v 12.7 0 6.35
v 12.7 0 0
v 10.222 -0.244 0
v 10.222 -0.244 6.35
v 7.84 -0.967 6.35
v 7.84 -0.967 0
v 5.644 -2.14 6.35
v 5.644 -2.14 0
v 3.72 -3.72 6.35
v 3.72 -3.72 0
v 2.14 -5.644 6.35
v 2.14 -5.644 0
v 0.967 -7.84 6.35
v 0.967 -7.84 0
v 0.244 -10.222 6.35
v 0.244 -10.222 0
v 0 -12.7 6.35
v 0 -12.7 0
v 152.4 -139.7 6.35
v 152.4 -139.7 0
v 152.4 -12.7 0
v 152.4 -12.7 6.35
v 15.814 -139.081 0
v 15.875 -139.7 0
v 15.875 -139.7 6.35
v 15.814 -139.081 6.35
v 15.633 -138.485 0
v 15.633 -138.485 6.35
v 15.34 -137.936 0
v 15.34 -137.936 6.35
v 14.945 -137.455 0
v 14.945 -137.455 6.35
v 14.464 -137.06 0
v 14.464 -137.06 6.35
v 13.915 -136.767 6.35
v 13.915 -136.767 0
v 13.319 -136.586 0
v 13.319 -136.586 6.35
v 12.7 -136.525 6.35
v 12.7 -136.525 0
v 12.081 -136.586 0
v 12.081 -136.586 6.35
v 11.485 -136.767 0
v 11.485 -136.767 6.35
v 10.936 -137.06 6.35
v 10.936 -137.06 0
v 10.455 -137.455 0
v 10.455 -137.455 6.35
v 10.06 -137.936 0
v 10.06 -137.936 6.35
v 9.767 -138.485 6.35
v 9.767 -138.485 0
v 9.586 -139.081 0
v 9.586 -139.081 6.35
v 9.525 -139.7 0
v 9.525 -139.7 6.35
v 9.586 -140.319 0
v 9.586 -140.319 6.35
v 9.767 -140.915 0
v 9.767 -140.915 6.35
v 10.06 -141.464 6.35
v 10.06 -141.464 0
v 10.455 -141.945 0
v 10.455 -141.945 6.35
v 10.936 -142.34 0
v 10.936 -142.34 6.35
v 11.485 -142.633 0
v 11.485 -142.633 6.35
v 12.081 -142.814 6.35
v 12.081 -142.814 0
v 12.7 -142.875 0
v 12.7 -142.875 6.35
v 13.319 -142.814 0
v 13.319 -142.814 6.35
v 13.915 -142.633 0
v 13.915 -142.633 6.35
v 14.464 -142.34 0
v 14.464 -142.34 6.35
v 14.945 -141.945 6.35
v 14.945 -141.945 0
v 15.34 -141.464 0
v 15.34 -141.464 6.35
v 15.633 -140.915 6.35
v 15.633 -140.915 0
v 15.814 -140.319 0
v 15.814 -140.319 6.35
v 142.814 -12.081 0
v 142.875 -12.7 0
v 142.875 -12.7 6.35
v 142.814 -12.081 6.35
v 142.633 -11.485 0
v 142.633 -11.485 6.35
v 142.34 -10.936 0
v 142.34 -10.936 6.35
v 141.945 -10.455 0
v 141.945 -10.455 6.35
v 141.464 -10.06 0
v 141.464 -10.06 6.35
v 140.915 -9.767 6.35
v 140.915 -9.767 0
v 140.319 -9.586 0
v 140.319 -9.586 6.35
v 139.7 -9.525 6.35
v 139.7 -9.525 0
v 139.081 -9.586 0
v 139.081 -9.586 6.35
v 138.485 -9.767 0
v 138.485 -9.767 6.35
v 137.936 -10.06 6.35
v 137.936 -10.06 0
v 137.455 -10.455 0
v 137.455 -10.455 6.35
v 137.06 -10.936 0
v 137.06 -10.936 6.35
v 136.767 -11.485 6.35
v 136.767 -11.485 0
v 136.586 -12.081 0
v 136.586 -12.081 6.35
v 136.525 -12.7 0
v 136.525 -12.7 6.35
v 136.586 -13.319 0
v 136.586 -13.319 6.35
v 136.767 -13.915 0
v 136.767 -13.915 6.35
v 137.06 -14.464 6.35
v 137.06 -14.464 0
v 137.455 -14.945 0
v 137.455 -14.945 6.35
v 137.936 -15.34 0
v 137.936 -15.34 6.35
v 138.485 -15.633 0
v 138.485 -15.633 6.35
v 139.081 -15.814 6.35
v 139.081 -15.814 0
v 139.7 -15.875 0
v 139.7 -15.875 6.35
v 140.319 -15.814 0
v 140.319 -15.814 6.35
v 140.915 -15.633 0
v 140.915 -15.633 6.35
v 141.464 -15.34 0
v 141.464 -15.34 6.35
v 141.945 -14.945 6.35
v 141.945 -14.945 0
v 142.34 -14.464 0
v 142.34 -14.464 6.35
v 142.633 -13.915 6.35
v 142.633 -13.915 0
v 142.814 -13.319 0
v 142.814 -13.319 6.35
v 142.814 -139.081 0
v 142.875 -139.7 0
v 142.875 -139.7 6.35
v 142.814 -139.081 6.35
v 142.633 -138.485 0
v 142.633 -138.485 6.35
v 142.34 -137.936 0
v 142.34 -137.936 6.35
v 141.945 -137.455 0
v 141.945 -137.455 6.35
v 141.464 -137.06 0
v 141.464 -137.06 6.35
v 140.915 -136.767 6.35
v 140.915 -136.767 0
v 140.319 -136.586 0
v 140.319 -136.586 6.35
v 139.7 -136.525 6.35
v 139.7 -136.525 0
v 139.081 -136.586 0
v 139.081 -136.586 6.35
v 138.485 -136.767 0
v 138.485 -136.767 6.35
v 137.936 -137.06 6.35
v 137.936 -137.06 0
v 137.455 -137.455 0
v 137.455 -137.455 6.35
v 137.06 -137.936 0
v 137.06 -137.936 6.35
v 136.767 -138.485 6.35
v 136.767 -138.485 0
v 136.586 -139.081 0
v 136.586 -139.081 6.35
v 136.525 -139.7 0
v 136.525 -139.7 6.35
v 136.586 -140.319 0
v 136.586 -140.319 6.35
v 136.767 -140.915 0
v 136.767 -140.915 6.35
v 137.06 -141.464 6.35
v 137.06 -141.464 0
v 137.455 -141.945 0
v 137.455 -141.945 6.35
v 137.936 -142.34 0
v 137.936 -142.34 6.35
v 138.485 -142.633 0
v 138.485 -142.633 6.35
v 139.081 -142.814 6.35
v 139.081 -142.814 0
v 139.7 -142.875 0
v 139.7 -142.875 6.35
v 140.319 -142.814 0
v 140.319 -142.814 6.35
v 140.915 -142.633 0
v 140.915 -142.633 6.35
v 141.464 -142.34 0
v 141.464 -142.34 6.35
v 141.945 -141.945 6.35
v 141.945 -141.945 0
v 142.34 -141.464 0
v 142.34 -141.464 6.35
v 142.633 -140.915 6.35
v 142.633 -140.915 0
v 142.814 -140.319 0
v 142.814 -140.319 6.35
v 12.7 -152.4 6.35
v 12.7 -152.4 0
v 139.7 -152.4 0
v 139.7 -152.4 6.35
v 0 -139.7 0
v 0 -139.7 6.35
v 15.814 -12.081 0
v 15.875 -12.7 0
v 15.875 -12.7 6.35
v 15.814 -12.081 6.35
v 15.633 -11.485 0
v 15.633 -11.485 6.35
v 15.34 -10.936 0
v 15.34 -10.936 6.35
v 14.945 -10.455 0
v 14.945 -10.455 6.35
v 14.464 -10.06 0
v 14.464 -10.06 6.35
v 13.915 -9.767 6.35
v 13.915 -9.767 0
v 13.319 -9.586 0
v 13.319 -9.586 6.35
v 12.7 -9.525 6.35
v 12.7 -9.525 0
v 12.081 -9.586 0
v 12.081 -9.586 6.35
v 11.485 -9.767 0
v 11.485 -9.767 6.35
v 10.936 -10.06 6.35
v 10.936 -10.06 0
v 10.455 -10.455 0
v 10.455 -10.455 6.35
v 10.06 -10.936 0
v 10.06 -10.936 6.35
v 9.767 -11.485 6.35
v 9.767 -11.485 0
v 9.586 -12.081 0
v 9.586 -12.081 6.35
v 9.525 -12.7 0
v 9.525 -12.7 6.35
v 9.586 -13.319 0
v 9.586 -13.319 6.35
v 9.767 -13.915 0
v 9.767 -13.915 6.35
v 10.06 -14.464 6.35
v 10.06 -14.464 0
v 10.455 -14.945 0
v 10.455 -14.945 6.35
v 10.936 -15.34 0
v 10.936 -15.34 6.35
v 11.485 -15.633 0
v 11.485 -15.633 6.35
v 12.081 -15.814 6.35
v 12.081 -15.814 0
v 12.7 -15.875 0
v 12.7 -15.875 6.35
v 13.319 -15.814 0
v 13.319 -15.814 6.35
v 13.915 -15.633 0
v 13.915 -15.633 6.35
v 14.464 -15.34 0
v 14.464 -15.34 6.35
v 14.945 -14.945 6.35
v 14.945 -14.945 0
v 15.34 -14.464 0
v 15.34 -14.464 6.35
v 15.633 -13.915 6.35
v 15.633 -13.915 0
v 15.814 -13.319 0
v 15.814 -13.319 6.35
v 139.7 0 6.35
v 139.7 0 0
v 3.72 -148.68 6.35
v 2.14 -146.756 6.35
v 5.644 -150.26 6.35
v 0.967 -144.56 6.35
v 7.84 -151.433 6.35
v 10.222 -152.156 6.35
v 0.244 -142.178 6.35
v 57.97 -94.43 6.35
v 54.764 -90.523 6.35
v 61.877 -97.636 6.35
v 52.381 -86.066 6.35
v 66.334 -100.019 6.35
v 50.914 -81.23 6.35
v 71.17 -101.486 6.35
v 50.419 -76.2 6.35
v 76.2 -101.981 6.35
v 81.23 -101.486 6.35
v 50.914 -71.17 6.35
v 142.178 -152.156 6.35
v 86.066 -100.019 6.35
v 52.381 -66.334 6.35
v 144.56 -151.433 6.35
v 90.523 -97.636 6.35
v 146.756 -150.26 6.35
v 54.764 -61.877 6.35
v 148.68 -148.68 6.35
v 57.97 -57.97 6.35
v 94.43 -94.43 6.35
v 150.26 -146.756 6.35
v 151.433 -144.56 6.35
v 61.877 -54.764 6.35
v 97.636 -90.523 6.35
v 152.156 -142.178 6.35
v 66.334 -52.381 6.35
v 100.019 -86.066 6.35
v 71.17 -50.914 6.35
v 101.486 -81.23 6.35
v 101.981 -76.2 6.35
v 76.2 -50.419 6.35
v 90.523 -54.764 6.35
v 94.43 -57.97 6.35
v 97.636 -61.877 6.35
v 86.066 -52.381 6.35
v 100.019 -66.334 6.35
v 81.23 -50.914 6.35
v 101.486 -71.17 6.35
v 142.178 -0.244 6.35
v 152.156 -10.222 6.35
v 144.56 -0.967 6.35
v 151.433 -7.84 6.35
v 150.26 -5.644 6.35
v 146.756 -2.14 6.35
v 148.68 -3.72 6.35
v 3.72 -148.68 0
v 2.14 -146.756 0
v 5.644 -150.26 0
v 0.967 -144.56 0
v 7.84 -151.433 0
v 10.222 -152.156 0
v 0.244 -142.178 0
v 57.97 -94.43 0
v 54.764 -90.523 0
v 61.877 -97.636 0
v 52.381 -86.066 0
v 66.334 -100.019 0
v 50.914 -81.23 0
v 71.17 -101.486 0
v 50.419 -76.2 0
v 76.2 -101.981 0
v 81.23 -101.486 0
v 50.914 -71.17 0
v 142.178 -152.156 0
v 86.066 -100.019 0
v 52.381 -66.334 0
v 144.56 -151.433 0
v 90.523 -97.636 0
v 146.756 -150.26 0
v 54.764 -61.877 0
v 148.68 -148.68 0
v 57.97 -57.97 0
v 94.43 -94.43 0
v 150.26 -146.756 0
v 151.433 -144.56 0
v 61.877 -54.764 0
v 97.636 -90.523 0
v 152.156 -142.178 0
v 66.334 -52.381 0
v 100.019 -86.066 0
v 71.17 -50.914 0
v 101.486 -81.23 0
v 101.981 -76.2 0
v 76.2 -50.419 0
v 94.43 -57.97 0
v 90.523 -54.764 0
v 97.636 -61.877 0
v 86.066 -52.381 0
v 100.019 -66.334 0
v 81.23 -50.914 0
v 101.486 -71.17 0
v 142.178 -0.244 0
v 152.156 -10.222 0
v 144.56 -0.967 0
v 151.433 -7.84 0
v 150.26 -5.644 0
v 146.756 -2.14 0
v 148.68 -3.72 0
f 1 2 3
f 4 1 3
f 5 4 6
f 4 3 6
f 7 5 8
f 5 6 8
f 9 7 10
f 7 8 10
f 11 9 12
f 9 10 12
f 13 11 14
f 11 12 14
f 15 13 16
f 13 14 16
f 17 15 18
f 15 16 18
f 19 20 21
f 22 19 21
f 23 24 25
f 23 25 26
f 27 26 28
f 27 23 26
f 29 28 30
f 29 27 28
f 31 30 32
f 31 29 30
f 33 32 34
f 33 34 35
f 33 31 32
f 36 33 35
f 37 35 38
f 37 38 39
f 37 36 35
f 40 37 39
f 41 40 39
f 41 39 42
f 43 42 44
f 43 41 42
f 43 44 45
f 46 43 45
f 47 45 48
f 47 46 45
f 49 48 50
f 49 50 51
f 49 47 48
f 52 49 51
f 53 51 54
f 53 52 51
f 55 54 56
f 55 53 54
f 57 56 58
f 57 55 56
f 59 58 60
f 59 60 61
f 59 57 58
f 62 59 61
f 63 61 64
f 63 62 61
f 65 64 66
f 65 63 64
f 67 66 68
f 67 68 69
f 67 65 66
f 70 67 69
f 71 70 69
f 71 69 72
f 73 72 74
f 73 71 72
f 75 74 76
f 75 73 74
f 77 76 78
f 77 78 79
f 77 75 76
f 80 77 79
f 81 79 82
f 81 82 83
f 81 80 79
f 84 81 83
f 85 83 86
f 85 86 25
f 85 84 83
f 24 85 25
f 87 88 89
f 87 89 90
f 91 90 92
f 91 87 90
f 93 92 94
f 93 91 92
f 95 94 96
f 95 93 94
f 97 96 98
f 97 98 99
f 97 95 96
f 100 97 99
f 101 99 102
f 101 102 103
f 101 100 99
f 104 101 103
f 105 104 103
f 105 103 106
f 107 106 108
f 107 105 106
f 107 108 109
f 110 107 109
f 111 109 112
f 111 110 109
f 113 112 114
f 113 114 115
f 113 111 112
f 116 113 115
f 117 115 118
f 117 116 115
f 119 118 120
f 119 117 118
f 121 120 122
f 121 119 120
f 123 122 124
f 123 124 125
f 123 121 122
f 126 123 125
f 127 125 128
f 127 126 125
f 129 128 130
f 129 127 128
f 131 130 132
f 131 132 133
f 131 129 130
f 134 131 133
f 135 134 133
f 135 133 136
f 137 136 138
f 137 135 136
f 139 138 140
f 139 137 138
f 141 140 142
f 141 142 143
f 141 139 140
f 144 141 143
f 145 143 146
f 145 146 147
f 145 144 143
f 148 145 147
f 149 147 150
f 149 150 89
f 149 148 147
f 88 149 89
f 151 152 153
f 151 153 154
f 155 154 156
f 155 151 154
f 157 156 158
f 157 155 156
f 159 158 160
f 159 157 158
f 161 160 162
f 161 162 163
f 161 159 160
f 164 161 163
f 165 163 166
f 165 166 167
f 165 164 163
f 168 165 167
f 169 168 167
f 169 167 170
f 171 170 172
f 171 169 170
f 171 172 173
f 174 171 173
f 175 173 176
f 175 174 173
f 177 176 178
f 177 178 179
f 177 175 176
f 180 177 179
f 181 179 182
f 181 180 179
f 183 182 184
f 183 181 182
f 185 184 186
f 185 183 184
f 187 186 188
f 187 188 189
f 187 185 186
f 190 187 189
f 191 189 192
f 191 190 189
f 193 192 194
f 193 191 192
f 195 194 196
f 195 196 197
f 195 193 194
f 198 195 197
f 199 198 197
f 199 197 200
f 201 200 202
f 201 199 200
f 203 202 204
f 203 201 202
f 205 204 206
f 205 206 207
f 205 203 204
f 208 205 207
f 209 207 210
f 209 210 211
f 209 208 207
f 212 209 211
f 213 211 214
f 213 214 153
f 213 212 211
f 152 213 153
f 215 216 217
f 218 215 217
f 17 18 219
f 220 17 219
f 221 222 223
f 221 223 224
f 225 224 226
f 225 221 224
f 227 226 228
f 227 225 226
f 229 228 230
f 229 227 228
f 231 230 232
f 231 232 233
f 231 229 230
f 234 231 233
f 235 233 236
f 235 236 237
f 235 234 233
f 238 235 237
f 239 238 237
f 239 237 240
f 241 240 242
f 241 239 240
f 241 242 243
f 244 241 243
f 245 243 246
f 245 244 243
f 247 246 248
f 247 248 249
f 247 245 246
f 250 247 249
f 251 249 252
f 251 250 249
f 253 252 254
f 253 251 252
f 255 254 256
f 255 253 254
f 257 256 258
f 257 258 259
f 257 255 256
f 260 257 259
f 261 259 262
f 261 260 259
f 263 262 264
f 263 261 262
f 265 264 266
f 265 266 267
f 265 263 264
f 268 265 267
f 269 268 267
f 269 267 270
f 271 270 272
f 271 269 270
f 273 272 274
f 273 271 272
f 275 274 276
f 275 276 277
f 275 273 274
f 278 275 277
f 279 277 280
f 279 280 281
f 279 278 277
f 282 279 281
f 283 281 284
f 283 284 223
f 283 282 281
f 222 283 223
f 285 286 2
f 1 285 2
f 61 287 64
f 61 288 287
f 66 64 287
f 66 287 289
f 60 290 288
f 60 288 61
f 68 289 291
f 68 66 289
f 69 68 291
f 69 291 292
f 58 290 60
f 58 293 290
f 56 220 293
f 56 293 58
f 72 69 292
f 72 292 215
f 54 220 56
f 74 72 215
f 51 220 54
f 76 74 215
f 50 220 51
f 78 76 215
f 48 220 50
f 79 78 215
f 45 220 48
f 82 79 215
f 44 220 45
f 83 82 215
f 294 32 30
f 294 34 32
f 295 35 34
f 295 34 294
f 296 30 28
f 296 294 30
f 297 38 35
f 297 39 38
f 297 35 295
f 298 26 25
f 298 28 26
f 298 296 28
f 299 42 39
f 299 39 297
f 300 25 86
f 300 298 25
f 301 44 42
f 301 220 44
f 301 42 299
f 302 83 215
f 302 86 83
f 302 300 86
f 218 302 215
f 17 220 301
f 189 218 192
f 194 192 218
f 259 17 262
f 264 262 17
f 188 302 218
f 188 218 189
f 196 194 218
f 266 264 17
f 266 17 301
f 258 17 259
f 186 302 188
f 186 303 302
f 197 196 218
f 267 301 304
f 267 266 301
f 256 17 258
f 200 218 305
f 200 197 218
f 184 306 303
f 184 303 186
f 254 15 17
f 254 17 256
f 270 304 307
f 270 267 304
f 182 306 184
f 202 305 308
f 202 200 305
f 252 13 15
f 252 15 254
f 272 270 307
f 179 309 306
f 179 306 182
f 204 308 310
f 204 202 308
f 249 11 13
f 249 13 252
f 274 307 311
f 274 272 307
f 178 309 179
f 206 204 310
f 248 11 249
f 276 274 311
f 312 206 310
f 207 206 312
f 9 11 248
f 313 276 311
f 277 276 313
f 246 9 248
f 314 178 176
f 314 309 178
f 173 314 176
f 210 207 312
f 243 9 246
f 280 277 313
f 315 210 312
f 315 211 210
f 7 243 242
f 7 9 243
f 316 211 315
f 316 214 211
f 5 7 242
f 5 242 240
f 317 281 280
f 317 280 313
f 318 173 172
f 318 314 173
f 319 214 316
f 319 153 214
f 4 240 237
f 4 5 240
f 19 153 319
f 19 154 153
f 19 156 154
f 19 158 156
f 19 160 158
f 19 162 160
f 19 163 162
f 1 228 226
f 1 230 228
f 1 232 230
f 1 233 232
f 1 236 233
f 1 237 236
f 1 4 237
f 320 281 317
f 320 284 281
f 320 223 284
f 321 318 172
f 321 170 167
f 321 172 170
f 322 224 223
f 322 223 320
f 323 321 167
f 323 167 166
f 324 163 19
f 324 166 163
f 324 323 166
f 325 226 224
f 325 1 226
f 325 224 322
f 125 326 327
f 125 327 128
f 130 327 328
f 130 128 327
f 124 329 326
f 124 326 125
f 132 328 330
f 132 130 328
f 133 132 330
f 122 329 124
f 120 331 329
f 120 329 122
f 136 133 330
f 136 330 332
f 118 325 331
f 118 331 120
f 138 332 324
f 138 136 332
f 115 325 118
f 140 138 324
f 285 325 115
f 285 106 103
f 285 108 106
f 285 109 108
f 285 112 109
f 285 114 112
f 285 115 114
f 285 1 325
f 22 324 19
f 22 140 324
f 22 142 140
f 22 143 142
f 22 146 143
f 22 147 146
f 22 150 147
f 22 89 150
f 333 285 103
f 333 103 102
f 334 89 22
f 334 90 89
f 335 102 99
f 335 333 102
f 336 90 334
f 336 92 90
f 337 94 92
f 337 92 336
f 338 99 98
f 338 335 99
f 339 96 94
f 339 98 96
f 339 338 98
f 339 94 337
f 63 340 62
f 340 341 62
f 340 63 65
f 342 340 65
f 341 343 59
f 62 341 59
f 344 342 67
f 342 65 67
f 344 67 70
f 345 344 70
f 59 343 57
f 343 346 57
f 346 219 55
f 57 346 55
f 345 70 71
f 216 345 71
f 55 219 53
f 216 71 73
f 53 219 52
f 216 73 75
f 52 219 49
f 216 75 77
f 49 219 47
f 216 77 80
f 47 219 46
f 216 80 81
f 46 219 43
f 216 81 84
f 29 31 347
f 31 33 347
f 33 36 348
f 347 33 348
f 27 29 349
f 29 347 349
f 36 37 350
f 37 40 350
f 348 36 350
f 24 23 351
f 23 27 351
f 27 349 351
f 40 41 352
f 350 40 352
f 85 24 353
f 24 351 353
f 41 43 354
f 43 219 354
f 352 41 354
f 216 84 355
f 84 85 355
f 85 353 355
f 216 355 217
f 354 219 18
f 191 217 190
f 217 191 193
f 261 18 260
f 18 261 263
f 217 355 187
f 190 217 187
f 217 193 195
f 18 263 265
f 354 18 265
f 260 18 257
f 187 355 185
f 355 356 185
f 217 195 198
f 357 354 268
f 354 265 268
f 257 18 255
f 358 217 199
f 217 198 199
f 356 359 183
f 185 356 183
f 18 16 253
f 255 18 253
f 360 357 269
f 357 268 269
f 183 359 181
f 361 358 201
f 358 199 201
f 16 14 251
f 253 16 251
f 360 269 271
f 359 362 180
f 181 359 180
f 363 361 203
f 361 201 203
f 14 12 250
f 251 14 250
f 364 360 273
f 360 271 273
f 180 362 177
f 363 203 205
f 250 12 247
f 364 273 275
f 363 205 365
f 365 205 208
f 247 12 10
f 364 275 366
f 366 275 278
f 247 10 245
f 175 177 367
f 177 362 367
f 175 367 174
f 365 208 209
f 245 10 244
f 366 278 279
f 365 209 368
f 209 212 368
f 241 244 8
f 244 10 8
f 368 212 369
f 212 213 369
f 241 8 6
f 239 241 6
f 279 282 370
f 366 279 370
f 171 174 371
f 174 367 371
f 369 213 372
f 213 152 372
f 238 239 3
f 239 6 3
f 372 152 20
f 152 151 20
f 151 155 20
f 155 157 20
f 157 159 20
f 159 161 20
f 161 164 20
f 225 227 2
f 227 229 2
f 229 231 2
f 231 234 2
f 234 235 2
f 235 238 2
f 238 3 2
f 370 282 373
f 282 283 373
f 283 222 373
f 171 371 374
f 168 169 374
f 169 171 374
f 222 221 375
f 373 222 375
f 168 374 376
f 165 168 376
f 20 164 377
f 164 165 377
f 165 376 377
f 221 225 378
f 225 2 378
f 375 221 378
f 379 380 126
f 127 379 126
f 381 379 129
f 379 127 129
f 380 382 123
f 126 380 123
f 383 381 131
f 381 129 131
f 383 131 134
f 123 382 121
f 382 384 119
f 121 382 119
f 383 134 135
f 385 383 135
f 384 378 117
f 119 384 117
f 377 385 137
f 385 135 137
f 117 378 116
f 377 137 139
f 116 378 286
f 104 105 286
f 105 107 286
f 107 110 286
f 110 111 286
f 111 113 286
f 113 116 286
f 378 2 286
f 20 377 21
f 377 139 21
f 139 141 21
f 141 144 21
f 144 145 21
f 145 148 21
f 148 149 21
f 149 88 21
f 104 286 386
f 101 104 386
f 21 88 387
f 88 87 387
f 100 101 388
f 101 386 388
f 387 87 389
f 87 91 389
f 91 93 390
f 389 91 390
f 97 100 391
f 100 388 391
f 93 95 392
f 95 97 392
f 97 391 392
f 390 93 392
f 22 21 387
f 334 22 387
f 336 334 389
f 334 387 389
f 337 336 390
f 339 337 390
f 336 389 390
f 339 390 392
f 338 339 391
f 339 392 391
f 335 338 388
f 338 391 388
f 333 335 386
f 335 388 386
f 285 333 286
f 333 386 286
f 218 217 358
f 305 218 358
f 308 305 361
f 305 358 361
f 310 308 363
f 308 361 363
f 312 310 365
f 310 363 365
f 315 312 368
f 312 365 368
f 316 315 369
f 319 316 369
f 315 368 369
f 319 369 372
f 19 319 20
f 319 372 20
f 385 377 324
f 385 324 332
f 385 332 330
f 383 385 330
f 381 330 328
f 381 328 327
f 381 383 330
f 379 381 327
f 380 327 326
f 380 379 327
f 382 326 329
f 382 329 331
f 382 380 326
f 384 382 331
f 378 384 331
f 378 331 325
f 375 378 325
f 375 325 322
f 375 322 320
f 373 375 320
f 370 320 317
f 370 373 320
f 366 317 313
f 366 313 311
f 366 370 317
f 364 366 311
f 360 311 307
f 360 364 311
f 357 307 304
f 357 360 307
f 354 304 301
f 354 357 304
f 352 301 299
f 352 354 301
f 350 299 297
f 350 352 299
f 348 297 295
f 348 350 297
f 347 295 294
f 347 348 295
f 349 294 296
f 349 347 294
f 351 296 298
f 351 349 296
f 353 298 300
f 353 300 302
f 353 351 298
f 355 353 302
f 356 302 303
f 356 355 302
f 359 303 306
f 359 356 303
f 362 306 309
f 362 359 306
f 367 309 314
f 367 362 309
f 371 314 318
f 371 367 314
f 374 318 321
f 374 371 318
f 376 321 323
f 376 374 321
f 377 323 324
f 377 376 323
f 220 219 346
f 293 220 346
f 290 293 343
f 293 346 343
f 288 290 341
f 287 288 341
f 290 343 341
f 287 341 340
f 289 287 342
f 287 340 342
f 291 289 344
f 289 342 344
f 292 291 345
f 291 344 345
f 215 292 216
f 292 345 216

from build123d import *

# Parameters (mm, degrees)
F0_R     = 3.175
F0_R_2   = 25.781
F1_DEPTH = 6.35


with BuildPart() as f1:
    # F0 (on Top) → F1 (new body)
    with BuildSketch(Plane.XY):
        with BuildLine():
            Line((139.7, 0), (12.7, 0))
            ThreePointArc((12.7, 0), (3.719744, -3.719744), (0, -12.7))
            Line((0, -12.7), (0, -139.7))
            ThreePointArc((0, -139.7), (3.719744, -148.680256), (12.7, -152.4))
            Line((12.7, -152.4), (139.7, -152.4))
            ThreePointArc((139.7, -152.4), (148.680256, -148.680256), (152.4, -139.7))
            Line((152.4, -139.7), (152.4, -12.7))
            ThreePointArc((152.4, -12.7), (148.680256, -3.719744), (139.7, 0))
        make_face()
        with Locations((12.7, -139.7)):
            Circle(F0_R, mode=Mode.SUBTRACT)
        with Locations((139.7, -139.7)):
            Circle(F0_R, mode=Mode.SUBTRACT)
        with Locations((76.2, -76.2)):
            Circle(F0_R_2, mode=Mode.SUBTRACT)
        with Locations((12.7, -12.7)):
            Circle(F0_R, mode=Mode.SUBTRACT)
        with Locations((139.7, -12.7)):
            Circle(F0_R, mode=Mode.SUBTRACT)
    extrude(amount=F1_DEPTH)


solid = f1.part
